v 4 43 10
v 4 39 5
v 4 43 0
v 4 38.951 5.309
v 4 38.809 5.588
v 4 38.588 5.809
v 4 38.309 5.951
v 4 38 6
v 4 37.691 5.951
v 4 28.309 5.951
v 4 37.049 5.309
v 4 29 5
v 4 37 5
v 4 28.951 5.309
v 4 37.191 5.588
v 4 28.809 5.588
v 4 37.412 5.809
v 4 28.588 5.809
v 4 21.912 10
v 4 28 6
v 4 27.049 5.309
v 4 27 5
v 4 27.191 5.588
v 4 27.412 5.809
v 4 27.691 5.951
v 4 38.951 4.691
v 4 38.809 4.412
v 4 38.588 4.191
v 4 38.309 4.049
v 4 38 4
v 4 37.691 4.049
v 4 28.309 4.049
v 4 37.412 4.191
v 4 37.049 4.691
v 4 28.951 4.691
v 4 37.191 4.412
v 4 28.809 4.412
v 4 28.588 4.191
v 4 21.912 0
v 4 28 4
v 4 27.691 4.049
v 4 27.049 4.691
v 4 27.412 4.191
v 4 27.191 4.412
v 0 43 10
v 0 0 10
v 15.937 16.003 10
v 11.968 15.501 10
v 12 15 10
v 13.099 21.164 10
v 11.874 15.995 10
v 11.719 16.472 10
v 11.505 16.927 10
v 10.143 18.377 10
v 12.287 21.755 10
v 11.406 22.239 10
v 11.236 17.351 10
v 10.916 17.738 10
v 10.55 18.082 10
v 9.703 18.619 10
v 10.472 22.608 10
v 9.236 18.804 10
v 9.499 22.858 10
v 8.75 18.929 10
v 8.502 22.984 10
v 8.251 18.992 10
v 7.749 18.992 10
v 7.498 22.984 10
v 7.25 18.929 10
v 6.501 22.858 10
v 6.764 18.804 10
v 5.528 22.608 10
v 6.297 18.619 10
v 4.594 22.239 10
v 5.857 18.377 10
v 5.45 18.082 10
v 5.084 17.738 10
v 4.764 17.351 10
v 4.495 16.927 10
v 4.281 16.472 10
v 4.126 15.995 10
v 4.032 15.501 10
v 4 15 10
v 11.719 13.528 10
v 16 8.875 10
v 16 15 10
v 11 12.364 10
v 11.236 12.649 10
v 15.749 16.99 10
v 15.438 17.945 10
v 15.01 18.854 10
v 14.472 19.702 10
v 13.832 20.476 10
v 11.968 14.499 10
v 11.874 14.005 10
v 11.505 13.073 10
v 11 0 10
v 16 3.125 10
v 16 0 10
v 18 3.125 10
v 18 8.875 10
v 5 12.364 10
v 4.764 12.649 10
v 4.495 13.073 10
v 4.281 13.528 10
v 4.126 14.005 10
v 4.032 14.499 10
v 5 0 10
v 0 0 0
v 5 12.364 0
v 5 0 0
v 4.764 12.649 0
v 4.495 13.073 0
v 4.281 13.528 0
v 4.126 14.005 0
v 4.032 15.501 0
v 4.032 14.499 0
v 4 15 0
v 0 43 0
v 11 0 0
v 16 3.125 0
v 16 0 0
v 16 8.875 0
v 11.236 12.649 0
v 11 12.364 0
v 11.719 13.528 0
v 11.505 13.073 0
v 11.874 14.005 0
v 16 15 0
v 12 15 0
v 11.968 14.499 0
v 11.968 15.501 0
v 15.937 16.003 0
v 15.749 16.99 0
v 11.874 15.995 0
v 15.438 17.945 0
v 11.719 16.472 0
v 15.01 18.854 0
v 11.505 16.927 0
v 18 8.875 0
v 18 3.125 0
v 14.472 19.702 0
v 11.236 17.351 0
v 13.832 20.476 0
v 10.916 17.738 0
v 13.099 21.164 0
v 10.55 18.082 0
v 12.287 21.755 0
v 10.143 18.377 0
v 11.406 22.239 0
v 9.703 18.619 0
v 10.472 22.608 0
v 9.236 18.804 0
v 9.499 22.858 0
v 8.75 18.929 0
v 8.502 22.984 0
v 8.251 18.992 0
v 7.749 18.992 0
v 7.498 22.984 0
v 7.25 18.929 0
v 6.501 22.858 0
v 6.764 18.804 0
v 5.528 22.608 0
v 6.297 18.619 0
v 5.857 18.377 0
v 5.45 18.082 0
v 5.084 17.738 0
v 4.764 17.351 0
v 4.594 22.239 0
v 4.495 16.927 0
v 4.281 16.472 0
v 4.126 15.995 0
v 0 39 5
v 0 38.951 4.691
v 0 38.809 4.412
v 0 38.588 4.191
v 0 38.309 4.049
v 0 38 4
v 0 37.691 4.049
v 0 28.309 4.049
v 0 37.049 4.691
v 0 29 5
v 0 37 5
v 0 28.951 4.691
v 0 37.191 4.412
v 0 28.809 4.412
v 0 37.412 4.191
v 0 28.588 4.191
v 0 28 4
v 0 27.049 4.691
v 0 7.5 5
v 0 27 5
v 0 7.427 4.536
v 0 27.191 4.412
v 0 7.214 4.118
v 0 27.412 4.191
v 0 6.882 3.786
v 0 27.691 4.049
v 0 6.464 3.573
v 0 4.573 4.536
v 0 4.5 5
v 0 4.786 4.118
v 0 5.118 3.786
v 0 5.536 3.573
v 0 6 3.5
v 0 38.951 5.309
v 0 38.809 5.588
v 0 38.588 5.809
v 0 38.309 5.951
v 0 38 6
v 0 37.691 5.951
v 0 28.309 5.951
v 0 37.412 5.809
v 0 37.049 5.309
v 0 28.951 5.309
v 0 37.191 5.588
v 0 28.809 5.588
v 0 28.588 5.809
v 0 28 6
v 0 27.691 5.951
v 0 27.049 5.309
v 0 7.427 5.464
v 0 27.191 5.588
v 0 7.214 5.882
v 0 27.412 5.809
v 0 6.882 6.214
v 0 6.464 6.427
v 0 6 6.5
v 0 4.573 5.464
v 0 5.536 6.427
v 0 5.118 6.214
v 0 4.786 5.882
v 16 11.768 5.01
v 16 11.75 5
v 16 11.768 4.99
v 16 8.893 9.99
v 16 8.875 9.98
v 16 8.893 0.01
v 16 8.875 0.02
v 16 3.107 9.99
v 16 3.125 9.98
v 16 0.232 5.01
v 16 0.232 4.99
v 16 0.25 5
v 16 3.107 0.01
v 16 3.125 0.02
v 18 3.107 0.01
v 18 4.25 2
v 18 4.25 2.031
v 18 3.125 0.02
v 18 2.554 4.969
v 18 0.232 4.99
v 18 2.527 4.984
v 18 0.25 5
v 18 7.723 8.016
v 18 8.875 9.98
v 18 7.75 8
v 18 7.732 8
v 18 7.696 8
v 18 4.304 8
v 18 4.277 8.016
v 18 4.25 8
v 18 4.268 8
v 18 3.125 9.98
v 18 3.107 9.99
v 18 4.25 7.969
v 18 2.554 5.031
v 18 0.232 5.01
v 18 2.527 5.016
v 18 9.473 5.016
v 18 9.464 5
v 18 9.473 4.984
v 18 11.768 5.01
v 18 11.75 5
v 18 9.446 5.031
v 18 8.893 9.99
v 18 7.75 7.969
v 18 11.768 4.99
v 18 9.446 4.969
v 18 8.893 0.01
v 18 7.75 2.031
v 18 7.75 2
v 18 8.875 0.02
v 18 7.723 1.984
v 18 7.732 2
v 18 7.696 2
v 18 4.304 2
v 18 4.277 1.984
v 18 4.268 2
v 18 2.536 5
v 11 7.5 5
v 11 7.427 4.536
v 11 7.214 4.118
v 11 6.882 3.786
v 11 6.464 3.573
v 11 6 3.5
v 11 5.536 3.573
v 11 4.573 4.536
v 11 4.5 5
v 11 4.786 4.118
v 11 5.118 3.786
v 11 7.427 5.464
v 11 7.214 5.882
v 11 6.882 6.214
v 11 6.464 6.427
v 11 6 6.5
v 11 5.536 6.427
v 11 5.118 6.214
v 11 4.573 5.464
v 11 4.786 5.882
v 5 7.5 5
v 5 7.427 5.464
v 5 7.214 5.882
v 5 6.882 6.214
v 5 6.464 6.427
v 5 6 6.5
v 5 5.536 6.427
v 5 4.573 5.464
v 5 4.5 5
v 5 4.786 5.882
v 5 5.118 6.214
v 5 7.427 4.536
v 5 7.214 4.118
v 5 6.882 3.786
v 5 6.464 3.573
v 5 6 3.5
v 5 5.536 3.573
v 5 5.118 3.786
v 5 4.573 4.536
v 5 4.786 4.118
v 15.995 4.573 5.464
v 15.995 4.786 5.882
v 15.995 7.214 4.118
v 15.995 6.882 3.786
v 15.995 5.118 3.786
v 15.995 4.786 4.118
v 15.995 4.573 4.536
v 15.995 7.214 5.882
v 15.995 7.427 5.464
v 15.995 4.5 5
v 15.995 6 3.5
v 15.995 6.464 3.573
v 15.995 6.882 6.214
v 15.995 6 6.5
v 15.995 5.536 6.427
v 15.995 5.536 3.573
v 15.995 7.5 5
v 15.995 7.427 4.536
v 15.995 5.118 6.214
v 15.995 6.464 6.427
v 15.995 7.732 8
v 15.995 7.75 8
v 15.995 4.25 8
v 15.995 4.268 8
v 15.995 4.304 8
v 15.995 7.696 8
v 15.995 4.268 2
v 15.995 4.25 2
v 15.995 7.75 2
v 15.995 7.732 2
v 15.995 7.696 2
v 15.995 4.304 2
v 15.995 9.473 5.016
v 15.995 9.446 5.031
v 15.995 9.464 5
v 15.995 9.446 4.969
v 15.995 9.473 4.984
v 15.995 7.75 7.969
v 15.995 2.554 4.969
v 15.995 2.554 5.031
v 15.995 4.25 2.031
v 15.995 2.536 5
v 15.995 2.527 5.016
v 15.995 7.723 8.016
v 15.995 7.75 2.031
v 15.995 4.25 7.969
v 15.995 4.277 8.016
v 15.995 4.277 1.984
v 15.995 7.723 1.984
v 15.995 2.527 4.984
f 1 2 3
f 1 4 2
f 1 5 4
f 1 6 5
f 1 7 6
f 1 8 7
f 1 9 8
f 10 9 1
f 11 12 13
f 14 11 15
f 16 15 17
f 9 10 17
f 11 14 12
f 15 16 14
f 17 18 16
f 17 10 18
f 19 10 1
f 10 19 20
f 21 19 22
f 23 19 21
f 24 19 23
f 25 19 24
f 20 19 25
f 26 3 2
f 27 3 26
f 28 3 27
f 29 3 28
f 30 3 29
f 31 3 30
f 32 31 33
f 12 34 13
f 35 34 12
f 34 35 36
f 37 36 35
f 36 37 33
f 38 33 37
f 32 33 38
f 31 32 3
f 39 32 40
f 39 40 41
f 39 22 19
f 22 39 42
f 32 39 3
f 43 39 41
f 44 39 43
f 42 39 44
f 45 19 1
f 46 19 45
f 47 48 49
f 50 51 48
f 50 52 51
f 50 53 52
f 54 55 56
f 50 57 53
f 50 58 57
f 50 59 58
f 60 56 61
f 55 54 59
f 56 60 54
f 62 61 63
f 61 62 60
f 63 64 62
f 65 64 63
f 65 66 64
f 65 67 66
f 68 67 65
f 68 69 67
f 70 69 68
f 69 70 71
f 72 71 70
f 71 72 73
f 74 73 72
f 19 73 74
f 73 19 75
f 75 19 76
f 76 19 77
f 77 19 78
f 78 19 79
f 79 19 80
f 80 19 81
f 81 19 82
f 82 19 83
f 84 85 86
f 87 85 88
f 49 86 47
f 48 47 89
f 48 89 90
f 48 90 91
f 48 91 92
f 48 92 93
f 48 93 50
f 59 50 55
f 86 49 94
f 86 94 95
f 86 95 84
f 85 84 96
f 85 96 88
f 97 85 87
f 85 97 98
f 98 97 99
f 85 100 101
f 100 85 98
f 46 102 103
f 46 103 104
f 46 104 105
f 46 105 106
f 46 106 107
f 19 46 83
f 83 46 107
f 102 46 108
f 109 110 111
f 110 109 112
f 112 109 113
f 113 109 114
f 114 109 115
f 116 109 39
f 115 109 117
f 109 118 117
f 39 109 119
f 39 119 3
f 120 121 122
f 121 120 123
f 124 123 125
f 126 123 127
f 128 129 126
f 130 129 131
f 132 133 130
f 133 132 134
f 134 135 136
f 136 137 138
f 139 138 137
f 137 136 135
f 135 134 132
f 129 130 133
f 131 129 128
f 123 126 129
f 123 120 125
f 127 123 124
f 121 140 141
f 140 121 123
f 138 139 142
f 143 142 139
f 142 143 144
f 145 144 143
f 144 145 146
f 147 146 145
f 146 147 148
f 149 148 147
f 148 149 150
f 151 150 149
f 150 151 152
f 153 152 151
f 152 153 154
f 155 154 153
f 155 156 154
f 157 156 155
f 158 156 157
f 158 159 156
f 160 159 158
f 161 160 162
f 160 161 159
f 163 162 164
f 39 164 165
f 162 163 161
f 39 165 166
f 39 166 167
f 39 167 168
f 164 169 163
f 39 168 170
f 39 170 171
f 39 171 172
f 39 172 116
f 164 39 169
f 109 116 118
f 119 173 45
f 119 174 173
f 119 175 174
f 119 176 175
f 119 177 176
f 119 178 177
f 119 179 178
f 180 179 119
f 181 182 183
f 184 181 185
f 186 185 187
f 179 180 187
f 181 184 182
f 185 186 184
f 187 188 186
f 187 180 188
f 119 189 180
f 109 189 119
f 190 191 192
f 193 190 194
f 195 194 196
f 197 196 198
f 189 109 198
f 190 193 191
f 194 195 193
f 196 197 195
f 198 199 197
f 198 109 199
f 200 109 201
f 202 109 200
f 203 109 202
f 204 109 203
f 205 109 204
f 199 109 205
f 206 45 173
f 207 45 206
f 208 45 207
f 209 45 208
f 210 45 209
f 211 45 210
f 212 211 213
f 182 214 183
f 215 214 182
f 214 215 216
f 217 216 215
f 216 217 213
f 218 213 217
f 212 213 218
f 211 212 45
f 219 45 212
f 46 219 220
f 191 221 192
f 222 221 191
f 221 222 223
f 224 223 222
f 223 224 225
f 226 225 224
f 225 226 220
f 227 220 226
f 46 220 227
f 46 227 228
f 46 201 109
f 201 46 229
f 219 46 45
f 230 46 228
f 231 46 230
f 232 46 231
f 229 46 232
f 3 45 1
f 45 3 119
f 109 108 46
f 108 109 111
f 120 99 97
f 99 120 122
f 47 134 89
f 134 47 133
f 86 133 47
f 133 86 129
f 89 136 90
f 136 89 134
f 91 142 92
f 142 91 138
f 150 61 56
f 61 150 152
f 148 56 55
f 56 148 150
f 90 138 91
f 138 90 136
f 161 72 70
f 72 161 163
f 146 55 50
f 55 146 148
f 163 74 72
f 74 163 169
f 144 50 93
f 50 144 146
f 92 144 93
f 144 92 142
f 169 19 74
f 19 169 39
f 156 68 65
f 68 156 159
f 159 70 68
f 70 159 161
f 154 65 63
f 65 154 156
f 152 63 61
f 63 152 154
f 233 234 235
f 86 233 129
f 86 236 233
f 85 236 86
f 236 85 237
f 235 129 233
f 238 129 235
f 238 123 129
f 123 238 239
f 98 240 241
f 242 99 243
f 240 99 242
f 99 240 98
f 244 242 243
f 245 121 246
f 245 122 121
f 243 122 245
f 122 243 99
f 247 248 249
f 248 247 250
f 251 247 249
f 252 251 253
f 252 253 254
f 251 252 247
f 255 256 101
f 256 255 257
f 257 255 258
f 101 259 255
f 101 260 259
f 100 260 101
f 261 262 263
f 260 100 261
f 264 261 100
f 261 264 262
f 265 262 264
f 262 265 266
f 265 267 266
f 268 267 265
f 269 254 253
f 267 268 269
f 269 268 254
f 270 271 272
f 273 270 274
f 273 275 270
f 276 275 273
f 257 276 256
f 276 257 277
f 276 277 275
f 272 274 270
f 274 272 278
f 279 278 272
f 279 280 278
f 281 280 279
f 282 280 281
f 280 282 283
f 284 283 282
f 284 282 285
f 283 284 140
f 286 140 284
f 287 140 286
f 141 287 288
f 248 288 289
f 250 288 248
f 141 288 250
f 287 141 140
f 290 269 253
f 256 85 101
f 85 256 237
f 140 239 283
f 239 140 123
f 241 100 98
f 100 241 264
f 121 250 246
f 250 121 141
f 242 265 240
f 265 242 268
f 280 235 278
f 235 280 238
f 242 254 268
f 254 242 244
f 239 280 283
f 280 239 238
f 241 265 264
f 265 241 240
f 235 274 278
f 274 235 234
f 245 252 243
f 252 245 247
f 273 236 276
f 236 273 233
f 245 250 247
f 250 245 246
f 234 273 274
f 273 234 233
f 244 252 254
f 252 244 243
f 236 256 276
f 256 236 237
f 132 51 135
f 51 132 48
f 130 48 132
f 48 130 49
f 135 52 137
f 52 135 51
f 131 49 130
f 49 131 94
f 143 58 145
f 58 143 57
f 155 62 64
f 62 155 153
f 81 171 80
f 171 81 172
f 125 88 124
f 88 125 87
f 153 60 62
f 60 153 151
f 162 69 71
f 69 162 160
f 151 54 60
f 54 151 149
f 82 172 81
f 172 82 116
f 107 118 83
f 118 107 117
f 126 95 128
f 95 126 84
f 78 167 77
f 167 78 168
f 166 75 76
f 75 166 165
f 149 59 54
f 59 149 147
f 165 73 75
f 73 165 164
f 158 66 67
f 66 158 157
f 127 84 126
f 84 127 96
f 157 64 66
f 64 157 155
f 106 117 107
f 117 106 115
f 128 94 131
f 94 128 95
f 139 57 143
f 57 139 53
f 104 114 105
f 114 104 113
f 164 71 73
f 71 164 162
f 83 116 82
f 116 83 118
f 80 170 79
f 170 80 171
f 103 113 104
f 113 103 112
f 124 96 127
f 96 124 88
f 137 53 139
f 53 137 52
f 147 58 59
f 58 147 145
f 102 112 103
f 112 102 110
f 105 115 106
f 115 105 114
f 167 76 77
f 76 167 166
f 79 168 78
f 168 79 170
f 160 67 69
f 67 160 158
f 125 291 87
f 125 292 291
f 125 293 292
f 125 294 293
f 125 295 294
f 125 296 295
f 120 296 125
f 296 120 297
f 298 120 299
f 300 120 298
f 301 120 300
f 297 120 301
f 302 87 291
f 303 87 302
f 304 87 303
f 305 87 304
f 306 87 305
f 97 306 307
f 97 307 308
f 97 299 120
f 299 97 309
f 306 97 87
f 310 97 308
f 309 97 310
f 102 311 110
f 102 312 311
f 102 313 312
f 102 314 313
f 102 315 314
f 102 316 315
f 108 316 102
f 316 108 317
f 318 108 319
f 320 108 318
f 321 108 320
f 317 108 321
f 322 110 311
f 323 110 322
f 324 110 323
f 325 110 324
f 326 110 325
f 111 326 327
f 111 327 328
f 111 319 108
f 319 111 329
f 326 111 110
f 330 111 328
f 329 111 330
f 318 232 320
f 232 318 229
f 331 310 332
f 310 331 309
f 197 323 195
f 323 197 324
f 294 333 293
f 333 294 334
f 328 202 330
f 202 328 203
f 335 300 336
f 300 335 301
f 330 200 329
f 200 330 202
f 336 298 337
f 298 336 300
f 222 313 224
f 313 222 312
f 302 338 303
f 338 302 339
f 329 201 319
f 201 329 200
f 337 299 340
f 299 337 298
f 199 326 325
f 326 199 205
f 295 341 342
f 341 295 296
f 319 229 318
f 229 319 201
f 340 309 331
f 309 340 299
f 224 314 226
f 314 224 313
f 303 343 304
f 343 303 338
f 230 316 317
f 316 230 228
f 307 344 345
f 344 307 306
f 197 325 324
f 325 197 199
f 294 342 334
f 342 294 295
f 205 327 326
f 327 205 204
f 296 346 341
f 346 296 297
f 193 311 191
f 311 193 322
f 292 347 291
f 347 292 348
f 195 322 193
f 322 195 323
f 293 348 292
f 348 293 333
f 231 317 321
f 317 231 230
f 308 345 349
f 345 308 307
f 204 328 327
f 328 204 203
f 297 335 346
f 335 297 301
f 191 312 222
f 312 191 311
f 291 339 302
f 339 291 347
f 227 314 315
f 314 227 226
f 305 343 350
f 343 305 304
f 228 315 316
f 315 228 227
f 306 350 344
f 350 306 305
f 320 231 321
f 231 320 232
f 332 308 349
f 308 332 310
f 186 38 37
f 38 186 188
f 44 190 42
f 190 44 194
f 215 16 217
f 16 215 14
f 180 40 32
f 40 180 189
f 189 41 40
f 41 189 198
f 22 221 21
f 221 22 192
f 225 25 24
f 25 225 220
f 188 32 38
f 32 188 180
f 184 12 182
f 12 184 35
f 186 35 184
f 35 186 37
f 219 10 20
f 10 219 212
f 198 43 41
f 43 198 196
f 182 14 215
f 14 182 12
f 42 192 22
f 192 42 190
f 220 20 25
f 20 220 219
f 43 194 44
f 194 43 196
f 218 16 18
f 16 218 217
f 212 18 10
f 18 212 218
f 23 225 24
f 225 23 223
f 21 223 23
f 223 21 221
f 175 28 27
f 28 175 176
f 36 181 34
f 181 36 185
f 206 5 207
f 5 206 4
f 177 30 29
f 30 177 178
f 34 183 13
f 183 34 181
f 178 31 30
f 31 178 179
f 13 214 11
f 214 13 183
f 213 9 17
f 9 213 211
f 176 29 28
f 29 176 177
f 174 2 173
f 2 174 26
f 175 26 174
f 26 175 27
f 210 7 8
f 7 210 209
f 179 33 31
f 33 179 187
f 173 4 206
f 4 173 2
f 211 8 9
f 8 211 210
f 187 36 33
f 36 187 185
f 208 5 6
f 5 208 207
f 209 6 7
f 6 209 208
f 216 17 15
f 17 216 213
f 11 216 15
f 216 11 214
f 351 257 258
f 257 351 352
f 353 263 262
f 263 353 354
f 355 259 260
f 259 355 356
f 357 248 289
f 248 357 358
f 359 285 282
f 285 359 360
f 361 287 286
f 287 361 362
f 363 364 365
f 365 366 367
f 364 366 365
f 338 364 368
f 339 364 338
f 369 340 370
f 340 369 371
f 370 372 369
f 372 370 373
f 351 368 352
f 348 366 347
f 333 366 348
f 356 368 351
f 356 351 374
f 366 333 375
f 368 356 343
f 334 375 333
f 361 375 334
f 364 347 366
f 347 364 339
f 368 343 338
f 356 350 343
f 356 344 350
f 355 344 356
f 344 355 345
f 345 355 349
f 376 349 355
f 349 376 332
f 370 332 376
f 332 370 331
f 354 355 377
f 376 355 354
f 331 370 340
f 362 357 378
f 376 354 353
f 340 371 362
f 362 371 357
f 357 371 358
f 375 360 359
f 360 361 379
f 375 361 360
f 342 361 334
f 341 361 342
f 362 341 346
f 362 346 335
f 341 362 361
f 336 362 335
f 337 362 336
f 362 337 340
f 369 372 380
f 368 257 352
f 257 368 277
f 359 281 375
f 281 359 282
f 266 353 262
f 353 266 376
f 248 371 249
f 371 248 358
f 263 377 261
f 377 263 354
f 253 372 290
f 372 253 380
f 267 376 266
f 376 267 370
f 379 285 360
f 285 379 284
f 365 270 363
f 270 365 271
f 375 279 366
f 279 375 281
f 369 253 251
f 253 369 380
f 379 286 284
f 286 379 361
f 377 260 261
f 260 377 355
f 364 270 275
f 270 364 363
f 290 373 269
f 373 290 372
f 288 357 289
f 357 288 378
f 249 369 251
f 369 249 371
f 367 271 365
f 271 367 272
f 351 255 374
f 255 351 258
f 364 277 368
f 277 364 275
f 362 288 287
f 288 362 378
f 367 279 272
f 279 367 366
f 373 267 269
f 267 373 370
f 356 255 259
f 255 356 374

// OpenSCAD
// file: micro_switch.scad
include <MCAD/materials.scad>
include <MCAD/metric_fastners.scad>

module micro_switch(with_extra_parts=false, exploded=false) {
  scale([-1,1,1]) translate([-19.8, 0, 0]){
    difference() {
      color(BlackPaint) cube([19.8, 10.8, 6.4]);

      translate([5.15, 2, 0]) {
        translate([0, 0, -0.5])
          cylinder(h = 7.4, R=2.6, $fn=100);
        translate([9.5, 0, -0.5])
        cylinder(h = 7.4, R=2.6, $fn=100);
      }
    }
    translate([2.8, 10.8, 1.2])
      rotate([0,0,10])
        color(Steel) cube([17,1,4]);

    if(with_extra_parts)
      micro_switch_extras(exploded_distance=(exploded?15:0));
  }

  module micro_switch_extras(exploded_distance=0) {
    screw_size = 2.2;
    screw_length = 13;
    echo("Non-Plastic Parts: 2 x Self tapping screw 2.2 x 13 mm for micro switch");
    translate([5.15, 2, 0]) color(Steel) {
      translate([0, 0, 0.5+6.4+exploded_distance])
        rotate([180,0,0]) csk_bolt(screw_size, screw_length);
      translate([9.5, 0, 0.5+6.4+exploded_distance])
        rotate([180,0,0]) csk_bolt(screw_size, screw_length);
    }
  }

}


micro_switch();
// main file
//Endstop Holder by NewtonrRob
//http://www.thingiverse.com/thing:30085
//http://creativecommons.org/licenses/by-sa/3.0/

include <MCAD/units.scad>
include <MCAD/materials.scad>
include <MCAD/metric_fastners.scad>
include <MCAD/nuts_and_bolts.scad>
use <micro_switch.scad>

module end_stop_holder(with_extra_parts=false, exploded=false) {
difference() {
	union() {
		cube([4,43,10]);  //4,45,10
		translate([8, 15,0]) cylinder(h = 10, r = 8, $fn = 50);
		cube([16, 15,10]);

		translate([17,6,5]) cube([2,5.75,10], center=true);
		translate([17,6,5]) rotate(a=[60,0,0]) cube([2,5.75,10], center=true);
		translate([17,6,5]) rotate(a=[120,0,0]) cube([2,5.75,10], center=true);
	}
	translate([8, 15,-epsilon]) cylinder(h = 10+2*epsilon, r = 4, $fn = 50);
	translate([5, -epsilon, -epsilon]) cube([6, 15+epsilon,10+2*epsilon]);
	translate([-10, 6, 5]) rotate(a=[0, 90, 0]) cylinder(h = 30, r = 1.5, $fn= 20);
	translate([-10, 28, 5]) rotate(a=[0, 90, 0]) cylinder(h = 30, r = 1, $fn= 20);
	translate([-10, 38, 5]) rotate(a=[0, 90, 0]) cylinder(h = 30, r = 1, $fn= 20);
	translate([17,6,5]) cube([2+epsilon,3.5,6], center=true);
	translate([17,6,5]) rotate(a=[60,0,0]) cube([2+epsilon,3.5,6], center=true);
	translate([17,6,5]) rotate(a=[120,0,0]) cube([2+epsilon,3.5,6], center=true);
}

  if(with_extra_parts) {
    end_stop_holder_extras(exploded_distance=(exploded?8:0));
  }

  module end_stop_holder_extras(exploded_distance=0) {
    echo("Non-Plastic Parts: 6 x M3 washer to attach micro switch on end_stop_holder");
    for(i = [0:2] ) {
      translate([4+i*0.3+(i+1)*0.2*exploded_distance, 28, 5]) rotate([0, 90, 0]) color(Steel) washer(3);
      translate([4+i*0.3+(i+1)*0.2*exploded_distance, 38, 5]) rotate([0, 90, 0]) color(Steel) washer(3);
    }

    echo("Non-Plastic Parts: 1 x Micro switch on end_stop_holder");
    translate([4+3*0.3+exploded_distance, 28-5.15+(10-9.5)/2, 5-2])
      rotate([90,0,90])
        micro_switch(with_extra_parts=true, exploded=(exploded_distance!=0));

    echo("Non-Plastic Parts: 1 x M3 x 18 mm bolt to attach end_stop_holder on smooth rod");
    translate([-3*exploded_distance,6,5])
      rotate([0,90,0])
        color(Steel) boltHole(size=3, length=18);

    echo("Non-Plastic Parts: 1 x M3 nut to attach end_stop_holder on smooth rod");
    translate([17+0.9*3/2+exploded_distance,6,5])
      rotate([0,-90,0])
        rotate([0,0,30]) color(Steel) flat_nut(3);
  }

}


end_stop_holder();
